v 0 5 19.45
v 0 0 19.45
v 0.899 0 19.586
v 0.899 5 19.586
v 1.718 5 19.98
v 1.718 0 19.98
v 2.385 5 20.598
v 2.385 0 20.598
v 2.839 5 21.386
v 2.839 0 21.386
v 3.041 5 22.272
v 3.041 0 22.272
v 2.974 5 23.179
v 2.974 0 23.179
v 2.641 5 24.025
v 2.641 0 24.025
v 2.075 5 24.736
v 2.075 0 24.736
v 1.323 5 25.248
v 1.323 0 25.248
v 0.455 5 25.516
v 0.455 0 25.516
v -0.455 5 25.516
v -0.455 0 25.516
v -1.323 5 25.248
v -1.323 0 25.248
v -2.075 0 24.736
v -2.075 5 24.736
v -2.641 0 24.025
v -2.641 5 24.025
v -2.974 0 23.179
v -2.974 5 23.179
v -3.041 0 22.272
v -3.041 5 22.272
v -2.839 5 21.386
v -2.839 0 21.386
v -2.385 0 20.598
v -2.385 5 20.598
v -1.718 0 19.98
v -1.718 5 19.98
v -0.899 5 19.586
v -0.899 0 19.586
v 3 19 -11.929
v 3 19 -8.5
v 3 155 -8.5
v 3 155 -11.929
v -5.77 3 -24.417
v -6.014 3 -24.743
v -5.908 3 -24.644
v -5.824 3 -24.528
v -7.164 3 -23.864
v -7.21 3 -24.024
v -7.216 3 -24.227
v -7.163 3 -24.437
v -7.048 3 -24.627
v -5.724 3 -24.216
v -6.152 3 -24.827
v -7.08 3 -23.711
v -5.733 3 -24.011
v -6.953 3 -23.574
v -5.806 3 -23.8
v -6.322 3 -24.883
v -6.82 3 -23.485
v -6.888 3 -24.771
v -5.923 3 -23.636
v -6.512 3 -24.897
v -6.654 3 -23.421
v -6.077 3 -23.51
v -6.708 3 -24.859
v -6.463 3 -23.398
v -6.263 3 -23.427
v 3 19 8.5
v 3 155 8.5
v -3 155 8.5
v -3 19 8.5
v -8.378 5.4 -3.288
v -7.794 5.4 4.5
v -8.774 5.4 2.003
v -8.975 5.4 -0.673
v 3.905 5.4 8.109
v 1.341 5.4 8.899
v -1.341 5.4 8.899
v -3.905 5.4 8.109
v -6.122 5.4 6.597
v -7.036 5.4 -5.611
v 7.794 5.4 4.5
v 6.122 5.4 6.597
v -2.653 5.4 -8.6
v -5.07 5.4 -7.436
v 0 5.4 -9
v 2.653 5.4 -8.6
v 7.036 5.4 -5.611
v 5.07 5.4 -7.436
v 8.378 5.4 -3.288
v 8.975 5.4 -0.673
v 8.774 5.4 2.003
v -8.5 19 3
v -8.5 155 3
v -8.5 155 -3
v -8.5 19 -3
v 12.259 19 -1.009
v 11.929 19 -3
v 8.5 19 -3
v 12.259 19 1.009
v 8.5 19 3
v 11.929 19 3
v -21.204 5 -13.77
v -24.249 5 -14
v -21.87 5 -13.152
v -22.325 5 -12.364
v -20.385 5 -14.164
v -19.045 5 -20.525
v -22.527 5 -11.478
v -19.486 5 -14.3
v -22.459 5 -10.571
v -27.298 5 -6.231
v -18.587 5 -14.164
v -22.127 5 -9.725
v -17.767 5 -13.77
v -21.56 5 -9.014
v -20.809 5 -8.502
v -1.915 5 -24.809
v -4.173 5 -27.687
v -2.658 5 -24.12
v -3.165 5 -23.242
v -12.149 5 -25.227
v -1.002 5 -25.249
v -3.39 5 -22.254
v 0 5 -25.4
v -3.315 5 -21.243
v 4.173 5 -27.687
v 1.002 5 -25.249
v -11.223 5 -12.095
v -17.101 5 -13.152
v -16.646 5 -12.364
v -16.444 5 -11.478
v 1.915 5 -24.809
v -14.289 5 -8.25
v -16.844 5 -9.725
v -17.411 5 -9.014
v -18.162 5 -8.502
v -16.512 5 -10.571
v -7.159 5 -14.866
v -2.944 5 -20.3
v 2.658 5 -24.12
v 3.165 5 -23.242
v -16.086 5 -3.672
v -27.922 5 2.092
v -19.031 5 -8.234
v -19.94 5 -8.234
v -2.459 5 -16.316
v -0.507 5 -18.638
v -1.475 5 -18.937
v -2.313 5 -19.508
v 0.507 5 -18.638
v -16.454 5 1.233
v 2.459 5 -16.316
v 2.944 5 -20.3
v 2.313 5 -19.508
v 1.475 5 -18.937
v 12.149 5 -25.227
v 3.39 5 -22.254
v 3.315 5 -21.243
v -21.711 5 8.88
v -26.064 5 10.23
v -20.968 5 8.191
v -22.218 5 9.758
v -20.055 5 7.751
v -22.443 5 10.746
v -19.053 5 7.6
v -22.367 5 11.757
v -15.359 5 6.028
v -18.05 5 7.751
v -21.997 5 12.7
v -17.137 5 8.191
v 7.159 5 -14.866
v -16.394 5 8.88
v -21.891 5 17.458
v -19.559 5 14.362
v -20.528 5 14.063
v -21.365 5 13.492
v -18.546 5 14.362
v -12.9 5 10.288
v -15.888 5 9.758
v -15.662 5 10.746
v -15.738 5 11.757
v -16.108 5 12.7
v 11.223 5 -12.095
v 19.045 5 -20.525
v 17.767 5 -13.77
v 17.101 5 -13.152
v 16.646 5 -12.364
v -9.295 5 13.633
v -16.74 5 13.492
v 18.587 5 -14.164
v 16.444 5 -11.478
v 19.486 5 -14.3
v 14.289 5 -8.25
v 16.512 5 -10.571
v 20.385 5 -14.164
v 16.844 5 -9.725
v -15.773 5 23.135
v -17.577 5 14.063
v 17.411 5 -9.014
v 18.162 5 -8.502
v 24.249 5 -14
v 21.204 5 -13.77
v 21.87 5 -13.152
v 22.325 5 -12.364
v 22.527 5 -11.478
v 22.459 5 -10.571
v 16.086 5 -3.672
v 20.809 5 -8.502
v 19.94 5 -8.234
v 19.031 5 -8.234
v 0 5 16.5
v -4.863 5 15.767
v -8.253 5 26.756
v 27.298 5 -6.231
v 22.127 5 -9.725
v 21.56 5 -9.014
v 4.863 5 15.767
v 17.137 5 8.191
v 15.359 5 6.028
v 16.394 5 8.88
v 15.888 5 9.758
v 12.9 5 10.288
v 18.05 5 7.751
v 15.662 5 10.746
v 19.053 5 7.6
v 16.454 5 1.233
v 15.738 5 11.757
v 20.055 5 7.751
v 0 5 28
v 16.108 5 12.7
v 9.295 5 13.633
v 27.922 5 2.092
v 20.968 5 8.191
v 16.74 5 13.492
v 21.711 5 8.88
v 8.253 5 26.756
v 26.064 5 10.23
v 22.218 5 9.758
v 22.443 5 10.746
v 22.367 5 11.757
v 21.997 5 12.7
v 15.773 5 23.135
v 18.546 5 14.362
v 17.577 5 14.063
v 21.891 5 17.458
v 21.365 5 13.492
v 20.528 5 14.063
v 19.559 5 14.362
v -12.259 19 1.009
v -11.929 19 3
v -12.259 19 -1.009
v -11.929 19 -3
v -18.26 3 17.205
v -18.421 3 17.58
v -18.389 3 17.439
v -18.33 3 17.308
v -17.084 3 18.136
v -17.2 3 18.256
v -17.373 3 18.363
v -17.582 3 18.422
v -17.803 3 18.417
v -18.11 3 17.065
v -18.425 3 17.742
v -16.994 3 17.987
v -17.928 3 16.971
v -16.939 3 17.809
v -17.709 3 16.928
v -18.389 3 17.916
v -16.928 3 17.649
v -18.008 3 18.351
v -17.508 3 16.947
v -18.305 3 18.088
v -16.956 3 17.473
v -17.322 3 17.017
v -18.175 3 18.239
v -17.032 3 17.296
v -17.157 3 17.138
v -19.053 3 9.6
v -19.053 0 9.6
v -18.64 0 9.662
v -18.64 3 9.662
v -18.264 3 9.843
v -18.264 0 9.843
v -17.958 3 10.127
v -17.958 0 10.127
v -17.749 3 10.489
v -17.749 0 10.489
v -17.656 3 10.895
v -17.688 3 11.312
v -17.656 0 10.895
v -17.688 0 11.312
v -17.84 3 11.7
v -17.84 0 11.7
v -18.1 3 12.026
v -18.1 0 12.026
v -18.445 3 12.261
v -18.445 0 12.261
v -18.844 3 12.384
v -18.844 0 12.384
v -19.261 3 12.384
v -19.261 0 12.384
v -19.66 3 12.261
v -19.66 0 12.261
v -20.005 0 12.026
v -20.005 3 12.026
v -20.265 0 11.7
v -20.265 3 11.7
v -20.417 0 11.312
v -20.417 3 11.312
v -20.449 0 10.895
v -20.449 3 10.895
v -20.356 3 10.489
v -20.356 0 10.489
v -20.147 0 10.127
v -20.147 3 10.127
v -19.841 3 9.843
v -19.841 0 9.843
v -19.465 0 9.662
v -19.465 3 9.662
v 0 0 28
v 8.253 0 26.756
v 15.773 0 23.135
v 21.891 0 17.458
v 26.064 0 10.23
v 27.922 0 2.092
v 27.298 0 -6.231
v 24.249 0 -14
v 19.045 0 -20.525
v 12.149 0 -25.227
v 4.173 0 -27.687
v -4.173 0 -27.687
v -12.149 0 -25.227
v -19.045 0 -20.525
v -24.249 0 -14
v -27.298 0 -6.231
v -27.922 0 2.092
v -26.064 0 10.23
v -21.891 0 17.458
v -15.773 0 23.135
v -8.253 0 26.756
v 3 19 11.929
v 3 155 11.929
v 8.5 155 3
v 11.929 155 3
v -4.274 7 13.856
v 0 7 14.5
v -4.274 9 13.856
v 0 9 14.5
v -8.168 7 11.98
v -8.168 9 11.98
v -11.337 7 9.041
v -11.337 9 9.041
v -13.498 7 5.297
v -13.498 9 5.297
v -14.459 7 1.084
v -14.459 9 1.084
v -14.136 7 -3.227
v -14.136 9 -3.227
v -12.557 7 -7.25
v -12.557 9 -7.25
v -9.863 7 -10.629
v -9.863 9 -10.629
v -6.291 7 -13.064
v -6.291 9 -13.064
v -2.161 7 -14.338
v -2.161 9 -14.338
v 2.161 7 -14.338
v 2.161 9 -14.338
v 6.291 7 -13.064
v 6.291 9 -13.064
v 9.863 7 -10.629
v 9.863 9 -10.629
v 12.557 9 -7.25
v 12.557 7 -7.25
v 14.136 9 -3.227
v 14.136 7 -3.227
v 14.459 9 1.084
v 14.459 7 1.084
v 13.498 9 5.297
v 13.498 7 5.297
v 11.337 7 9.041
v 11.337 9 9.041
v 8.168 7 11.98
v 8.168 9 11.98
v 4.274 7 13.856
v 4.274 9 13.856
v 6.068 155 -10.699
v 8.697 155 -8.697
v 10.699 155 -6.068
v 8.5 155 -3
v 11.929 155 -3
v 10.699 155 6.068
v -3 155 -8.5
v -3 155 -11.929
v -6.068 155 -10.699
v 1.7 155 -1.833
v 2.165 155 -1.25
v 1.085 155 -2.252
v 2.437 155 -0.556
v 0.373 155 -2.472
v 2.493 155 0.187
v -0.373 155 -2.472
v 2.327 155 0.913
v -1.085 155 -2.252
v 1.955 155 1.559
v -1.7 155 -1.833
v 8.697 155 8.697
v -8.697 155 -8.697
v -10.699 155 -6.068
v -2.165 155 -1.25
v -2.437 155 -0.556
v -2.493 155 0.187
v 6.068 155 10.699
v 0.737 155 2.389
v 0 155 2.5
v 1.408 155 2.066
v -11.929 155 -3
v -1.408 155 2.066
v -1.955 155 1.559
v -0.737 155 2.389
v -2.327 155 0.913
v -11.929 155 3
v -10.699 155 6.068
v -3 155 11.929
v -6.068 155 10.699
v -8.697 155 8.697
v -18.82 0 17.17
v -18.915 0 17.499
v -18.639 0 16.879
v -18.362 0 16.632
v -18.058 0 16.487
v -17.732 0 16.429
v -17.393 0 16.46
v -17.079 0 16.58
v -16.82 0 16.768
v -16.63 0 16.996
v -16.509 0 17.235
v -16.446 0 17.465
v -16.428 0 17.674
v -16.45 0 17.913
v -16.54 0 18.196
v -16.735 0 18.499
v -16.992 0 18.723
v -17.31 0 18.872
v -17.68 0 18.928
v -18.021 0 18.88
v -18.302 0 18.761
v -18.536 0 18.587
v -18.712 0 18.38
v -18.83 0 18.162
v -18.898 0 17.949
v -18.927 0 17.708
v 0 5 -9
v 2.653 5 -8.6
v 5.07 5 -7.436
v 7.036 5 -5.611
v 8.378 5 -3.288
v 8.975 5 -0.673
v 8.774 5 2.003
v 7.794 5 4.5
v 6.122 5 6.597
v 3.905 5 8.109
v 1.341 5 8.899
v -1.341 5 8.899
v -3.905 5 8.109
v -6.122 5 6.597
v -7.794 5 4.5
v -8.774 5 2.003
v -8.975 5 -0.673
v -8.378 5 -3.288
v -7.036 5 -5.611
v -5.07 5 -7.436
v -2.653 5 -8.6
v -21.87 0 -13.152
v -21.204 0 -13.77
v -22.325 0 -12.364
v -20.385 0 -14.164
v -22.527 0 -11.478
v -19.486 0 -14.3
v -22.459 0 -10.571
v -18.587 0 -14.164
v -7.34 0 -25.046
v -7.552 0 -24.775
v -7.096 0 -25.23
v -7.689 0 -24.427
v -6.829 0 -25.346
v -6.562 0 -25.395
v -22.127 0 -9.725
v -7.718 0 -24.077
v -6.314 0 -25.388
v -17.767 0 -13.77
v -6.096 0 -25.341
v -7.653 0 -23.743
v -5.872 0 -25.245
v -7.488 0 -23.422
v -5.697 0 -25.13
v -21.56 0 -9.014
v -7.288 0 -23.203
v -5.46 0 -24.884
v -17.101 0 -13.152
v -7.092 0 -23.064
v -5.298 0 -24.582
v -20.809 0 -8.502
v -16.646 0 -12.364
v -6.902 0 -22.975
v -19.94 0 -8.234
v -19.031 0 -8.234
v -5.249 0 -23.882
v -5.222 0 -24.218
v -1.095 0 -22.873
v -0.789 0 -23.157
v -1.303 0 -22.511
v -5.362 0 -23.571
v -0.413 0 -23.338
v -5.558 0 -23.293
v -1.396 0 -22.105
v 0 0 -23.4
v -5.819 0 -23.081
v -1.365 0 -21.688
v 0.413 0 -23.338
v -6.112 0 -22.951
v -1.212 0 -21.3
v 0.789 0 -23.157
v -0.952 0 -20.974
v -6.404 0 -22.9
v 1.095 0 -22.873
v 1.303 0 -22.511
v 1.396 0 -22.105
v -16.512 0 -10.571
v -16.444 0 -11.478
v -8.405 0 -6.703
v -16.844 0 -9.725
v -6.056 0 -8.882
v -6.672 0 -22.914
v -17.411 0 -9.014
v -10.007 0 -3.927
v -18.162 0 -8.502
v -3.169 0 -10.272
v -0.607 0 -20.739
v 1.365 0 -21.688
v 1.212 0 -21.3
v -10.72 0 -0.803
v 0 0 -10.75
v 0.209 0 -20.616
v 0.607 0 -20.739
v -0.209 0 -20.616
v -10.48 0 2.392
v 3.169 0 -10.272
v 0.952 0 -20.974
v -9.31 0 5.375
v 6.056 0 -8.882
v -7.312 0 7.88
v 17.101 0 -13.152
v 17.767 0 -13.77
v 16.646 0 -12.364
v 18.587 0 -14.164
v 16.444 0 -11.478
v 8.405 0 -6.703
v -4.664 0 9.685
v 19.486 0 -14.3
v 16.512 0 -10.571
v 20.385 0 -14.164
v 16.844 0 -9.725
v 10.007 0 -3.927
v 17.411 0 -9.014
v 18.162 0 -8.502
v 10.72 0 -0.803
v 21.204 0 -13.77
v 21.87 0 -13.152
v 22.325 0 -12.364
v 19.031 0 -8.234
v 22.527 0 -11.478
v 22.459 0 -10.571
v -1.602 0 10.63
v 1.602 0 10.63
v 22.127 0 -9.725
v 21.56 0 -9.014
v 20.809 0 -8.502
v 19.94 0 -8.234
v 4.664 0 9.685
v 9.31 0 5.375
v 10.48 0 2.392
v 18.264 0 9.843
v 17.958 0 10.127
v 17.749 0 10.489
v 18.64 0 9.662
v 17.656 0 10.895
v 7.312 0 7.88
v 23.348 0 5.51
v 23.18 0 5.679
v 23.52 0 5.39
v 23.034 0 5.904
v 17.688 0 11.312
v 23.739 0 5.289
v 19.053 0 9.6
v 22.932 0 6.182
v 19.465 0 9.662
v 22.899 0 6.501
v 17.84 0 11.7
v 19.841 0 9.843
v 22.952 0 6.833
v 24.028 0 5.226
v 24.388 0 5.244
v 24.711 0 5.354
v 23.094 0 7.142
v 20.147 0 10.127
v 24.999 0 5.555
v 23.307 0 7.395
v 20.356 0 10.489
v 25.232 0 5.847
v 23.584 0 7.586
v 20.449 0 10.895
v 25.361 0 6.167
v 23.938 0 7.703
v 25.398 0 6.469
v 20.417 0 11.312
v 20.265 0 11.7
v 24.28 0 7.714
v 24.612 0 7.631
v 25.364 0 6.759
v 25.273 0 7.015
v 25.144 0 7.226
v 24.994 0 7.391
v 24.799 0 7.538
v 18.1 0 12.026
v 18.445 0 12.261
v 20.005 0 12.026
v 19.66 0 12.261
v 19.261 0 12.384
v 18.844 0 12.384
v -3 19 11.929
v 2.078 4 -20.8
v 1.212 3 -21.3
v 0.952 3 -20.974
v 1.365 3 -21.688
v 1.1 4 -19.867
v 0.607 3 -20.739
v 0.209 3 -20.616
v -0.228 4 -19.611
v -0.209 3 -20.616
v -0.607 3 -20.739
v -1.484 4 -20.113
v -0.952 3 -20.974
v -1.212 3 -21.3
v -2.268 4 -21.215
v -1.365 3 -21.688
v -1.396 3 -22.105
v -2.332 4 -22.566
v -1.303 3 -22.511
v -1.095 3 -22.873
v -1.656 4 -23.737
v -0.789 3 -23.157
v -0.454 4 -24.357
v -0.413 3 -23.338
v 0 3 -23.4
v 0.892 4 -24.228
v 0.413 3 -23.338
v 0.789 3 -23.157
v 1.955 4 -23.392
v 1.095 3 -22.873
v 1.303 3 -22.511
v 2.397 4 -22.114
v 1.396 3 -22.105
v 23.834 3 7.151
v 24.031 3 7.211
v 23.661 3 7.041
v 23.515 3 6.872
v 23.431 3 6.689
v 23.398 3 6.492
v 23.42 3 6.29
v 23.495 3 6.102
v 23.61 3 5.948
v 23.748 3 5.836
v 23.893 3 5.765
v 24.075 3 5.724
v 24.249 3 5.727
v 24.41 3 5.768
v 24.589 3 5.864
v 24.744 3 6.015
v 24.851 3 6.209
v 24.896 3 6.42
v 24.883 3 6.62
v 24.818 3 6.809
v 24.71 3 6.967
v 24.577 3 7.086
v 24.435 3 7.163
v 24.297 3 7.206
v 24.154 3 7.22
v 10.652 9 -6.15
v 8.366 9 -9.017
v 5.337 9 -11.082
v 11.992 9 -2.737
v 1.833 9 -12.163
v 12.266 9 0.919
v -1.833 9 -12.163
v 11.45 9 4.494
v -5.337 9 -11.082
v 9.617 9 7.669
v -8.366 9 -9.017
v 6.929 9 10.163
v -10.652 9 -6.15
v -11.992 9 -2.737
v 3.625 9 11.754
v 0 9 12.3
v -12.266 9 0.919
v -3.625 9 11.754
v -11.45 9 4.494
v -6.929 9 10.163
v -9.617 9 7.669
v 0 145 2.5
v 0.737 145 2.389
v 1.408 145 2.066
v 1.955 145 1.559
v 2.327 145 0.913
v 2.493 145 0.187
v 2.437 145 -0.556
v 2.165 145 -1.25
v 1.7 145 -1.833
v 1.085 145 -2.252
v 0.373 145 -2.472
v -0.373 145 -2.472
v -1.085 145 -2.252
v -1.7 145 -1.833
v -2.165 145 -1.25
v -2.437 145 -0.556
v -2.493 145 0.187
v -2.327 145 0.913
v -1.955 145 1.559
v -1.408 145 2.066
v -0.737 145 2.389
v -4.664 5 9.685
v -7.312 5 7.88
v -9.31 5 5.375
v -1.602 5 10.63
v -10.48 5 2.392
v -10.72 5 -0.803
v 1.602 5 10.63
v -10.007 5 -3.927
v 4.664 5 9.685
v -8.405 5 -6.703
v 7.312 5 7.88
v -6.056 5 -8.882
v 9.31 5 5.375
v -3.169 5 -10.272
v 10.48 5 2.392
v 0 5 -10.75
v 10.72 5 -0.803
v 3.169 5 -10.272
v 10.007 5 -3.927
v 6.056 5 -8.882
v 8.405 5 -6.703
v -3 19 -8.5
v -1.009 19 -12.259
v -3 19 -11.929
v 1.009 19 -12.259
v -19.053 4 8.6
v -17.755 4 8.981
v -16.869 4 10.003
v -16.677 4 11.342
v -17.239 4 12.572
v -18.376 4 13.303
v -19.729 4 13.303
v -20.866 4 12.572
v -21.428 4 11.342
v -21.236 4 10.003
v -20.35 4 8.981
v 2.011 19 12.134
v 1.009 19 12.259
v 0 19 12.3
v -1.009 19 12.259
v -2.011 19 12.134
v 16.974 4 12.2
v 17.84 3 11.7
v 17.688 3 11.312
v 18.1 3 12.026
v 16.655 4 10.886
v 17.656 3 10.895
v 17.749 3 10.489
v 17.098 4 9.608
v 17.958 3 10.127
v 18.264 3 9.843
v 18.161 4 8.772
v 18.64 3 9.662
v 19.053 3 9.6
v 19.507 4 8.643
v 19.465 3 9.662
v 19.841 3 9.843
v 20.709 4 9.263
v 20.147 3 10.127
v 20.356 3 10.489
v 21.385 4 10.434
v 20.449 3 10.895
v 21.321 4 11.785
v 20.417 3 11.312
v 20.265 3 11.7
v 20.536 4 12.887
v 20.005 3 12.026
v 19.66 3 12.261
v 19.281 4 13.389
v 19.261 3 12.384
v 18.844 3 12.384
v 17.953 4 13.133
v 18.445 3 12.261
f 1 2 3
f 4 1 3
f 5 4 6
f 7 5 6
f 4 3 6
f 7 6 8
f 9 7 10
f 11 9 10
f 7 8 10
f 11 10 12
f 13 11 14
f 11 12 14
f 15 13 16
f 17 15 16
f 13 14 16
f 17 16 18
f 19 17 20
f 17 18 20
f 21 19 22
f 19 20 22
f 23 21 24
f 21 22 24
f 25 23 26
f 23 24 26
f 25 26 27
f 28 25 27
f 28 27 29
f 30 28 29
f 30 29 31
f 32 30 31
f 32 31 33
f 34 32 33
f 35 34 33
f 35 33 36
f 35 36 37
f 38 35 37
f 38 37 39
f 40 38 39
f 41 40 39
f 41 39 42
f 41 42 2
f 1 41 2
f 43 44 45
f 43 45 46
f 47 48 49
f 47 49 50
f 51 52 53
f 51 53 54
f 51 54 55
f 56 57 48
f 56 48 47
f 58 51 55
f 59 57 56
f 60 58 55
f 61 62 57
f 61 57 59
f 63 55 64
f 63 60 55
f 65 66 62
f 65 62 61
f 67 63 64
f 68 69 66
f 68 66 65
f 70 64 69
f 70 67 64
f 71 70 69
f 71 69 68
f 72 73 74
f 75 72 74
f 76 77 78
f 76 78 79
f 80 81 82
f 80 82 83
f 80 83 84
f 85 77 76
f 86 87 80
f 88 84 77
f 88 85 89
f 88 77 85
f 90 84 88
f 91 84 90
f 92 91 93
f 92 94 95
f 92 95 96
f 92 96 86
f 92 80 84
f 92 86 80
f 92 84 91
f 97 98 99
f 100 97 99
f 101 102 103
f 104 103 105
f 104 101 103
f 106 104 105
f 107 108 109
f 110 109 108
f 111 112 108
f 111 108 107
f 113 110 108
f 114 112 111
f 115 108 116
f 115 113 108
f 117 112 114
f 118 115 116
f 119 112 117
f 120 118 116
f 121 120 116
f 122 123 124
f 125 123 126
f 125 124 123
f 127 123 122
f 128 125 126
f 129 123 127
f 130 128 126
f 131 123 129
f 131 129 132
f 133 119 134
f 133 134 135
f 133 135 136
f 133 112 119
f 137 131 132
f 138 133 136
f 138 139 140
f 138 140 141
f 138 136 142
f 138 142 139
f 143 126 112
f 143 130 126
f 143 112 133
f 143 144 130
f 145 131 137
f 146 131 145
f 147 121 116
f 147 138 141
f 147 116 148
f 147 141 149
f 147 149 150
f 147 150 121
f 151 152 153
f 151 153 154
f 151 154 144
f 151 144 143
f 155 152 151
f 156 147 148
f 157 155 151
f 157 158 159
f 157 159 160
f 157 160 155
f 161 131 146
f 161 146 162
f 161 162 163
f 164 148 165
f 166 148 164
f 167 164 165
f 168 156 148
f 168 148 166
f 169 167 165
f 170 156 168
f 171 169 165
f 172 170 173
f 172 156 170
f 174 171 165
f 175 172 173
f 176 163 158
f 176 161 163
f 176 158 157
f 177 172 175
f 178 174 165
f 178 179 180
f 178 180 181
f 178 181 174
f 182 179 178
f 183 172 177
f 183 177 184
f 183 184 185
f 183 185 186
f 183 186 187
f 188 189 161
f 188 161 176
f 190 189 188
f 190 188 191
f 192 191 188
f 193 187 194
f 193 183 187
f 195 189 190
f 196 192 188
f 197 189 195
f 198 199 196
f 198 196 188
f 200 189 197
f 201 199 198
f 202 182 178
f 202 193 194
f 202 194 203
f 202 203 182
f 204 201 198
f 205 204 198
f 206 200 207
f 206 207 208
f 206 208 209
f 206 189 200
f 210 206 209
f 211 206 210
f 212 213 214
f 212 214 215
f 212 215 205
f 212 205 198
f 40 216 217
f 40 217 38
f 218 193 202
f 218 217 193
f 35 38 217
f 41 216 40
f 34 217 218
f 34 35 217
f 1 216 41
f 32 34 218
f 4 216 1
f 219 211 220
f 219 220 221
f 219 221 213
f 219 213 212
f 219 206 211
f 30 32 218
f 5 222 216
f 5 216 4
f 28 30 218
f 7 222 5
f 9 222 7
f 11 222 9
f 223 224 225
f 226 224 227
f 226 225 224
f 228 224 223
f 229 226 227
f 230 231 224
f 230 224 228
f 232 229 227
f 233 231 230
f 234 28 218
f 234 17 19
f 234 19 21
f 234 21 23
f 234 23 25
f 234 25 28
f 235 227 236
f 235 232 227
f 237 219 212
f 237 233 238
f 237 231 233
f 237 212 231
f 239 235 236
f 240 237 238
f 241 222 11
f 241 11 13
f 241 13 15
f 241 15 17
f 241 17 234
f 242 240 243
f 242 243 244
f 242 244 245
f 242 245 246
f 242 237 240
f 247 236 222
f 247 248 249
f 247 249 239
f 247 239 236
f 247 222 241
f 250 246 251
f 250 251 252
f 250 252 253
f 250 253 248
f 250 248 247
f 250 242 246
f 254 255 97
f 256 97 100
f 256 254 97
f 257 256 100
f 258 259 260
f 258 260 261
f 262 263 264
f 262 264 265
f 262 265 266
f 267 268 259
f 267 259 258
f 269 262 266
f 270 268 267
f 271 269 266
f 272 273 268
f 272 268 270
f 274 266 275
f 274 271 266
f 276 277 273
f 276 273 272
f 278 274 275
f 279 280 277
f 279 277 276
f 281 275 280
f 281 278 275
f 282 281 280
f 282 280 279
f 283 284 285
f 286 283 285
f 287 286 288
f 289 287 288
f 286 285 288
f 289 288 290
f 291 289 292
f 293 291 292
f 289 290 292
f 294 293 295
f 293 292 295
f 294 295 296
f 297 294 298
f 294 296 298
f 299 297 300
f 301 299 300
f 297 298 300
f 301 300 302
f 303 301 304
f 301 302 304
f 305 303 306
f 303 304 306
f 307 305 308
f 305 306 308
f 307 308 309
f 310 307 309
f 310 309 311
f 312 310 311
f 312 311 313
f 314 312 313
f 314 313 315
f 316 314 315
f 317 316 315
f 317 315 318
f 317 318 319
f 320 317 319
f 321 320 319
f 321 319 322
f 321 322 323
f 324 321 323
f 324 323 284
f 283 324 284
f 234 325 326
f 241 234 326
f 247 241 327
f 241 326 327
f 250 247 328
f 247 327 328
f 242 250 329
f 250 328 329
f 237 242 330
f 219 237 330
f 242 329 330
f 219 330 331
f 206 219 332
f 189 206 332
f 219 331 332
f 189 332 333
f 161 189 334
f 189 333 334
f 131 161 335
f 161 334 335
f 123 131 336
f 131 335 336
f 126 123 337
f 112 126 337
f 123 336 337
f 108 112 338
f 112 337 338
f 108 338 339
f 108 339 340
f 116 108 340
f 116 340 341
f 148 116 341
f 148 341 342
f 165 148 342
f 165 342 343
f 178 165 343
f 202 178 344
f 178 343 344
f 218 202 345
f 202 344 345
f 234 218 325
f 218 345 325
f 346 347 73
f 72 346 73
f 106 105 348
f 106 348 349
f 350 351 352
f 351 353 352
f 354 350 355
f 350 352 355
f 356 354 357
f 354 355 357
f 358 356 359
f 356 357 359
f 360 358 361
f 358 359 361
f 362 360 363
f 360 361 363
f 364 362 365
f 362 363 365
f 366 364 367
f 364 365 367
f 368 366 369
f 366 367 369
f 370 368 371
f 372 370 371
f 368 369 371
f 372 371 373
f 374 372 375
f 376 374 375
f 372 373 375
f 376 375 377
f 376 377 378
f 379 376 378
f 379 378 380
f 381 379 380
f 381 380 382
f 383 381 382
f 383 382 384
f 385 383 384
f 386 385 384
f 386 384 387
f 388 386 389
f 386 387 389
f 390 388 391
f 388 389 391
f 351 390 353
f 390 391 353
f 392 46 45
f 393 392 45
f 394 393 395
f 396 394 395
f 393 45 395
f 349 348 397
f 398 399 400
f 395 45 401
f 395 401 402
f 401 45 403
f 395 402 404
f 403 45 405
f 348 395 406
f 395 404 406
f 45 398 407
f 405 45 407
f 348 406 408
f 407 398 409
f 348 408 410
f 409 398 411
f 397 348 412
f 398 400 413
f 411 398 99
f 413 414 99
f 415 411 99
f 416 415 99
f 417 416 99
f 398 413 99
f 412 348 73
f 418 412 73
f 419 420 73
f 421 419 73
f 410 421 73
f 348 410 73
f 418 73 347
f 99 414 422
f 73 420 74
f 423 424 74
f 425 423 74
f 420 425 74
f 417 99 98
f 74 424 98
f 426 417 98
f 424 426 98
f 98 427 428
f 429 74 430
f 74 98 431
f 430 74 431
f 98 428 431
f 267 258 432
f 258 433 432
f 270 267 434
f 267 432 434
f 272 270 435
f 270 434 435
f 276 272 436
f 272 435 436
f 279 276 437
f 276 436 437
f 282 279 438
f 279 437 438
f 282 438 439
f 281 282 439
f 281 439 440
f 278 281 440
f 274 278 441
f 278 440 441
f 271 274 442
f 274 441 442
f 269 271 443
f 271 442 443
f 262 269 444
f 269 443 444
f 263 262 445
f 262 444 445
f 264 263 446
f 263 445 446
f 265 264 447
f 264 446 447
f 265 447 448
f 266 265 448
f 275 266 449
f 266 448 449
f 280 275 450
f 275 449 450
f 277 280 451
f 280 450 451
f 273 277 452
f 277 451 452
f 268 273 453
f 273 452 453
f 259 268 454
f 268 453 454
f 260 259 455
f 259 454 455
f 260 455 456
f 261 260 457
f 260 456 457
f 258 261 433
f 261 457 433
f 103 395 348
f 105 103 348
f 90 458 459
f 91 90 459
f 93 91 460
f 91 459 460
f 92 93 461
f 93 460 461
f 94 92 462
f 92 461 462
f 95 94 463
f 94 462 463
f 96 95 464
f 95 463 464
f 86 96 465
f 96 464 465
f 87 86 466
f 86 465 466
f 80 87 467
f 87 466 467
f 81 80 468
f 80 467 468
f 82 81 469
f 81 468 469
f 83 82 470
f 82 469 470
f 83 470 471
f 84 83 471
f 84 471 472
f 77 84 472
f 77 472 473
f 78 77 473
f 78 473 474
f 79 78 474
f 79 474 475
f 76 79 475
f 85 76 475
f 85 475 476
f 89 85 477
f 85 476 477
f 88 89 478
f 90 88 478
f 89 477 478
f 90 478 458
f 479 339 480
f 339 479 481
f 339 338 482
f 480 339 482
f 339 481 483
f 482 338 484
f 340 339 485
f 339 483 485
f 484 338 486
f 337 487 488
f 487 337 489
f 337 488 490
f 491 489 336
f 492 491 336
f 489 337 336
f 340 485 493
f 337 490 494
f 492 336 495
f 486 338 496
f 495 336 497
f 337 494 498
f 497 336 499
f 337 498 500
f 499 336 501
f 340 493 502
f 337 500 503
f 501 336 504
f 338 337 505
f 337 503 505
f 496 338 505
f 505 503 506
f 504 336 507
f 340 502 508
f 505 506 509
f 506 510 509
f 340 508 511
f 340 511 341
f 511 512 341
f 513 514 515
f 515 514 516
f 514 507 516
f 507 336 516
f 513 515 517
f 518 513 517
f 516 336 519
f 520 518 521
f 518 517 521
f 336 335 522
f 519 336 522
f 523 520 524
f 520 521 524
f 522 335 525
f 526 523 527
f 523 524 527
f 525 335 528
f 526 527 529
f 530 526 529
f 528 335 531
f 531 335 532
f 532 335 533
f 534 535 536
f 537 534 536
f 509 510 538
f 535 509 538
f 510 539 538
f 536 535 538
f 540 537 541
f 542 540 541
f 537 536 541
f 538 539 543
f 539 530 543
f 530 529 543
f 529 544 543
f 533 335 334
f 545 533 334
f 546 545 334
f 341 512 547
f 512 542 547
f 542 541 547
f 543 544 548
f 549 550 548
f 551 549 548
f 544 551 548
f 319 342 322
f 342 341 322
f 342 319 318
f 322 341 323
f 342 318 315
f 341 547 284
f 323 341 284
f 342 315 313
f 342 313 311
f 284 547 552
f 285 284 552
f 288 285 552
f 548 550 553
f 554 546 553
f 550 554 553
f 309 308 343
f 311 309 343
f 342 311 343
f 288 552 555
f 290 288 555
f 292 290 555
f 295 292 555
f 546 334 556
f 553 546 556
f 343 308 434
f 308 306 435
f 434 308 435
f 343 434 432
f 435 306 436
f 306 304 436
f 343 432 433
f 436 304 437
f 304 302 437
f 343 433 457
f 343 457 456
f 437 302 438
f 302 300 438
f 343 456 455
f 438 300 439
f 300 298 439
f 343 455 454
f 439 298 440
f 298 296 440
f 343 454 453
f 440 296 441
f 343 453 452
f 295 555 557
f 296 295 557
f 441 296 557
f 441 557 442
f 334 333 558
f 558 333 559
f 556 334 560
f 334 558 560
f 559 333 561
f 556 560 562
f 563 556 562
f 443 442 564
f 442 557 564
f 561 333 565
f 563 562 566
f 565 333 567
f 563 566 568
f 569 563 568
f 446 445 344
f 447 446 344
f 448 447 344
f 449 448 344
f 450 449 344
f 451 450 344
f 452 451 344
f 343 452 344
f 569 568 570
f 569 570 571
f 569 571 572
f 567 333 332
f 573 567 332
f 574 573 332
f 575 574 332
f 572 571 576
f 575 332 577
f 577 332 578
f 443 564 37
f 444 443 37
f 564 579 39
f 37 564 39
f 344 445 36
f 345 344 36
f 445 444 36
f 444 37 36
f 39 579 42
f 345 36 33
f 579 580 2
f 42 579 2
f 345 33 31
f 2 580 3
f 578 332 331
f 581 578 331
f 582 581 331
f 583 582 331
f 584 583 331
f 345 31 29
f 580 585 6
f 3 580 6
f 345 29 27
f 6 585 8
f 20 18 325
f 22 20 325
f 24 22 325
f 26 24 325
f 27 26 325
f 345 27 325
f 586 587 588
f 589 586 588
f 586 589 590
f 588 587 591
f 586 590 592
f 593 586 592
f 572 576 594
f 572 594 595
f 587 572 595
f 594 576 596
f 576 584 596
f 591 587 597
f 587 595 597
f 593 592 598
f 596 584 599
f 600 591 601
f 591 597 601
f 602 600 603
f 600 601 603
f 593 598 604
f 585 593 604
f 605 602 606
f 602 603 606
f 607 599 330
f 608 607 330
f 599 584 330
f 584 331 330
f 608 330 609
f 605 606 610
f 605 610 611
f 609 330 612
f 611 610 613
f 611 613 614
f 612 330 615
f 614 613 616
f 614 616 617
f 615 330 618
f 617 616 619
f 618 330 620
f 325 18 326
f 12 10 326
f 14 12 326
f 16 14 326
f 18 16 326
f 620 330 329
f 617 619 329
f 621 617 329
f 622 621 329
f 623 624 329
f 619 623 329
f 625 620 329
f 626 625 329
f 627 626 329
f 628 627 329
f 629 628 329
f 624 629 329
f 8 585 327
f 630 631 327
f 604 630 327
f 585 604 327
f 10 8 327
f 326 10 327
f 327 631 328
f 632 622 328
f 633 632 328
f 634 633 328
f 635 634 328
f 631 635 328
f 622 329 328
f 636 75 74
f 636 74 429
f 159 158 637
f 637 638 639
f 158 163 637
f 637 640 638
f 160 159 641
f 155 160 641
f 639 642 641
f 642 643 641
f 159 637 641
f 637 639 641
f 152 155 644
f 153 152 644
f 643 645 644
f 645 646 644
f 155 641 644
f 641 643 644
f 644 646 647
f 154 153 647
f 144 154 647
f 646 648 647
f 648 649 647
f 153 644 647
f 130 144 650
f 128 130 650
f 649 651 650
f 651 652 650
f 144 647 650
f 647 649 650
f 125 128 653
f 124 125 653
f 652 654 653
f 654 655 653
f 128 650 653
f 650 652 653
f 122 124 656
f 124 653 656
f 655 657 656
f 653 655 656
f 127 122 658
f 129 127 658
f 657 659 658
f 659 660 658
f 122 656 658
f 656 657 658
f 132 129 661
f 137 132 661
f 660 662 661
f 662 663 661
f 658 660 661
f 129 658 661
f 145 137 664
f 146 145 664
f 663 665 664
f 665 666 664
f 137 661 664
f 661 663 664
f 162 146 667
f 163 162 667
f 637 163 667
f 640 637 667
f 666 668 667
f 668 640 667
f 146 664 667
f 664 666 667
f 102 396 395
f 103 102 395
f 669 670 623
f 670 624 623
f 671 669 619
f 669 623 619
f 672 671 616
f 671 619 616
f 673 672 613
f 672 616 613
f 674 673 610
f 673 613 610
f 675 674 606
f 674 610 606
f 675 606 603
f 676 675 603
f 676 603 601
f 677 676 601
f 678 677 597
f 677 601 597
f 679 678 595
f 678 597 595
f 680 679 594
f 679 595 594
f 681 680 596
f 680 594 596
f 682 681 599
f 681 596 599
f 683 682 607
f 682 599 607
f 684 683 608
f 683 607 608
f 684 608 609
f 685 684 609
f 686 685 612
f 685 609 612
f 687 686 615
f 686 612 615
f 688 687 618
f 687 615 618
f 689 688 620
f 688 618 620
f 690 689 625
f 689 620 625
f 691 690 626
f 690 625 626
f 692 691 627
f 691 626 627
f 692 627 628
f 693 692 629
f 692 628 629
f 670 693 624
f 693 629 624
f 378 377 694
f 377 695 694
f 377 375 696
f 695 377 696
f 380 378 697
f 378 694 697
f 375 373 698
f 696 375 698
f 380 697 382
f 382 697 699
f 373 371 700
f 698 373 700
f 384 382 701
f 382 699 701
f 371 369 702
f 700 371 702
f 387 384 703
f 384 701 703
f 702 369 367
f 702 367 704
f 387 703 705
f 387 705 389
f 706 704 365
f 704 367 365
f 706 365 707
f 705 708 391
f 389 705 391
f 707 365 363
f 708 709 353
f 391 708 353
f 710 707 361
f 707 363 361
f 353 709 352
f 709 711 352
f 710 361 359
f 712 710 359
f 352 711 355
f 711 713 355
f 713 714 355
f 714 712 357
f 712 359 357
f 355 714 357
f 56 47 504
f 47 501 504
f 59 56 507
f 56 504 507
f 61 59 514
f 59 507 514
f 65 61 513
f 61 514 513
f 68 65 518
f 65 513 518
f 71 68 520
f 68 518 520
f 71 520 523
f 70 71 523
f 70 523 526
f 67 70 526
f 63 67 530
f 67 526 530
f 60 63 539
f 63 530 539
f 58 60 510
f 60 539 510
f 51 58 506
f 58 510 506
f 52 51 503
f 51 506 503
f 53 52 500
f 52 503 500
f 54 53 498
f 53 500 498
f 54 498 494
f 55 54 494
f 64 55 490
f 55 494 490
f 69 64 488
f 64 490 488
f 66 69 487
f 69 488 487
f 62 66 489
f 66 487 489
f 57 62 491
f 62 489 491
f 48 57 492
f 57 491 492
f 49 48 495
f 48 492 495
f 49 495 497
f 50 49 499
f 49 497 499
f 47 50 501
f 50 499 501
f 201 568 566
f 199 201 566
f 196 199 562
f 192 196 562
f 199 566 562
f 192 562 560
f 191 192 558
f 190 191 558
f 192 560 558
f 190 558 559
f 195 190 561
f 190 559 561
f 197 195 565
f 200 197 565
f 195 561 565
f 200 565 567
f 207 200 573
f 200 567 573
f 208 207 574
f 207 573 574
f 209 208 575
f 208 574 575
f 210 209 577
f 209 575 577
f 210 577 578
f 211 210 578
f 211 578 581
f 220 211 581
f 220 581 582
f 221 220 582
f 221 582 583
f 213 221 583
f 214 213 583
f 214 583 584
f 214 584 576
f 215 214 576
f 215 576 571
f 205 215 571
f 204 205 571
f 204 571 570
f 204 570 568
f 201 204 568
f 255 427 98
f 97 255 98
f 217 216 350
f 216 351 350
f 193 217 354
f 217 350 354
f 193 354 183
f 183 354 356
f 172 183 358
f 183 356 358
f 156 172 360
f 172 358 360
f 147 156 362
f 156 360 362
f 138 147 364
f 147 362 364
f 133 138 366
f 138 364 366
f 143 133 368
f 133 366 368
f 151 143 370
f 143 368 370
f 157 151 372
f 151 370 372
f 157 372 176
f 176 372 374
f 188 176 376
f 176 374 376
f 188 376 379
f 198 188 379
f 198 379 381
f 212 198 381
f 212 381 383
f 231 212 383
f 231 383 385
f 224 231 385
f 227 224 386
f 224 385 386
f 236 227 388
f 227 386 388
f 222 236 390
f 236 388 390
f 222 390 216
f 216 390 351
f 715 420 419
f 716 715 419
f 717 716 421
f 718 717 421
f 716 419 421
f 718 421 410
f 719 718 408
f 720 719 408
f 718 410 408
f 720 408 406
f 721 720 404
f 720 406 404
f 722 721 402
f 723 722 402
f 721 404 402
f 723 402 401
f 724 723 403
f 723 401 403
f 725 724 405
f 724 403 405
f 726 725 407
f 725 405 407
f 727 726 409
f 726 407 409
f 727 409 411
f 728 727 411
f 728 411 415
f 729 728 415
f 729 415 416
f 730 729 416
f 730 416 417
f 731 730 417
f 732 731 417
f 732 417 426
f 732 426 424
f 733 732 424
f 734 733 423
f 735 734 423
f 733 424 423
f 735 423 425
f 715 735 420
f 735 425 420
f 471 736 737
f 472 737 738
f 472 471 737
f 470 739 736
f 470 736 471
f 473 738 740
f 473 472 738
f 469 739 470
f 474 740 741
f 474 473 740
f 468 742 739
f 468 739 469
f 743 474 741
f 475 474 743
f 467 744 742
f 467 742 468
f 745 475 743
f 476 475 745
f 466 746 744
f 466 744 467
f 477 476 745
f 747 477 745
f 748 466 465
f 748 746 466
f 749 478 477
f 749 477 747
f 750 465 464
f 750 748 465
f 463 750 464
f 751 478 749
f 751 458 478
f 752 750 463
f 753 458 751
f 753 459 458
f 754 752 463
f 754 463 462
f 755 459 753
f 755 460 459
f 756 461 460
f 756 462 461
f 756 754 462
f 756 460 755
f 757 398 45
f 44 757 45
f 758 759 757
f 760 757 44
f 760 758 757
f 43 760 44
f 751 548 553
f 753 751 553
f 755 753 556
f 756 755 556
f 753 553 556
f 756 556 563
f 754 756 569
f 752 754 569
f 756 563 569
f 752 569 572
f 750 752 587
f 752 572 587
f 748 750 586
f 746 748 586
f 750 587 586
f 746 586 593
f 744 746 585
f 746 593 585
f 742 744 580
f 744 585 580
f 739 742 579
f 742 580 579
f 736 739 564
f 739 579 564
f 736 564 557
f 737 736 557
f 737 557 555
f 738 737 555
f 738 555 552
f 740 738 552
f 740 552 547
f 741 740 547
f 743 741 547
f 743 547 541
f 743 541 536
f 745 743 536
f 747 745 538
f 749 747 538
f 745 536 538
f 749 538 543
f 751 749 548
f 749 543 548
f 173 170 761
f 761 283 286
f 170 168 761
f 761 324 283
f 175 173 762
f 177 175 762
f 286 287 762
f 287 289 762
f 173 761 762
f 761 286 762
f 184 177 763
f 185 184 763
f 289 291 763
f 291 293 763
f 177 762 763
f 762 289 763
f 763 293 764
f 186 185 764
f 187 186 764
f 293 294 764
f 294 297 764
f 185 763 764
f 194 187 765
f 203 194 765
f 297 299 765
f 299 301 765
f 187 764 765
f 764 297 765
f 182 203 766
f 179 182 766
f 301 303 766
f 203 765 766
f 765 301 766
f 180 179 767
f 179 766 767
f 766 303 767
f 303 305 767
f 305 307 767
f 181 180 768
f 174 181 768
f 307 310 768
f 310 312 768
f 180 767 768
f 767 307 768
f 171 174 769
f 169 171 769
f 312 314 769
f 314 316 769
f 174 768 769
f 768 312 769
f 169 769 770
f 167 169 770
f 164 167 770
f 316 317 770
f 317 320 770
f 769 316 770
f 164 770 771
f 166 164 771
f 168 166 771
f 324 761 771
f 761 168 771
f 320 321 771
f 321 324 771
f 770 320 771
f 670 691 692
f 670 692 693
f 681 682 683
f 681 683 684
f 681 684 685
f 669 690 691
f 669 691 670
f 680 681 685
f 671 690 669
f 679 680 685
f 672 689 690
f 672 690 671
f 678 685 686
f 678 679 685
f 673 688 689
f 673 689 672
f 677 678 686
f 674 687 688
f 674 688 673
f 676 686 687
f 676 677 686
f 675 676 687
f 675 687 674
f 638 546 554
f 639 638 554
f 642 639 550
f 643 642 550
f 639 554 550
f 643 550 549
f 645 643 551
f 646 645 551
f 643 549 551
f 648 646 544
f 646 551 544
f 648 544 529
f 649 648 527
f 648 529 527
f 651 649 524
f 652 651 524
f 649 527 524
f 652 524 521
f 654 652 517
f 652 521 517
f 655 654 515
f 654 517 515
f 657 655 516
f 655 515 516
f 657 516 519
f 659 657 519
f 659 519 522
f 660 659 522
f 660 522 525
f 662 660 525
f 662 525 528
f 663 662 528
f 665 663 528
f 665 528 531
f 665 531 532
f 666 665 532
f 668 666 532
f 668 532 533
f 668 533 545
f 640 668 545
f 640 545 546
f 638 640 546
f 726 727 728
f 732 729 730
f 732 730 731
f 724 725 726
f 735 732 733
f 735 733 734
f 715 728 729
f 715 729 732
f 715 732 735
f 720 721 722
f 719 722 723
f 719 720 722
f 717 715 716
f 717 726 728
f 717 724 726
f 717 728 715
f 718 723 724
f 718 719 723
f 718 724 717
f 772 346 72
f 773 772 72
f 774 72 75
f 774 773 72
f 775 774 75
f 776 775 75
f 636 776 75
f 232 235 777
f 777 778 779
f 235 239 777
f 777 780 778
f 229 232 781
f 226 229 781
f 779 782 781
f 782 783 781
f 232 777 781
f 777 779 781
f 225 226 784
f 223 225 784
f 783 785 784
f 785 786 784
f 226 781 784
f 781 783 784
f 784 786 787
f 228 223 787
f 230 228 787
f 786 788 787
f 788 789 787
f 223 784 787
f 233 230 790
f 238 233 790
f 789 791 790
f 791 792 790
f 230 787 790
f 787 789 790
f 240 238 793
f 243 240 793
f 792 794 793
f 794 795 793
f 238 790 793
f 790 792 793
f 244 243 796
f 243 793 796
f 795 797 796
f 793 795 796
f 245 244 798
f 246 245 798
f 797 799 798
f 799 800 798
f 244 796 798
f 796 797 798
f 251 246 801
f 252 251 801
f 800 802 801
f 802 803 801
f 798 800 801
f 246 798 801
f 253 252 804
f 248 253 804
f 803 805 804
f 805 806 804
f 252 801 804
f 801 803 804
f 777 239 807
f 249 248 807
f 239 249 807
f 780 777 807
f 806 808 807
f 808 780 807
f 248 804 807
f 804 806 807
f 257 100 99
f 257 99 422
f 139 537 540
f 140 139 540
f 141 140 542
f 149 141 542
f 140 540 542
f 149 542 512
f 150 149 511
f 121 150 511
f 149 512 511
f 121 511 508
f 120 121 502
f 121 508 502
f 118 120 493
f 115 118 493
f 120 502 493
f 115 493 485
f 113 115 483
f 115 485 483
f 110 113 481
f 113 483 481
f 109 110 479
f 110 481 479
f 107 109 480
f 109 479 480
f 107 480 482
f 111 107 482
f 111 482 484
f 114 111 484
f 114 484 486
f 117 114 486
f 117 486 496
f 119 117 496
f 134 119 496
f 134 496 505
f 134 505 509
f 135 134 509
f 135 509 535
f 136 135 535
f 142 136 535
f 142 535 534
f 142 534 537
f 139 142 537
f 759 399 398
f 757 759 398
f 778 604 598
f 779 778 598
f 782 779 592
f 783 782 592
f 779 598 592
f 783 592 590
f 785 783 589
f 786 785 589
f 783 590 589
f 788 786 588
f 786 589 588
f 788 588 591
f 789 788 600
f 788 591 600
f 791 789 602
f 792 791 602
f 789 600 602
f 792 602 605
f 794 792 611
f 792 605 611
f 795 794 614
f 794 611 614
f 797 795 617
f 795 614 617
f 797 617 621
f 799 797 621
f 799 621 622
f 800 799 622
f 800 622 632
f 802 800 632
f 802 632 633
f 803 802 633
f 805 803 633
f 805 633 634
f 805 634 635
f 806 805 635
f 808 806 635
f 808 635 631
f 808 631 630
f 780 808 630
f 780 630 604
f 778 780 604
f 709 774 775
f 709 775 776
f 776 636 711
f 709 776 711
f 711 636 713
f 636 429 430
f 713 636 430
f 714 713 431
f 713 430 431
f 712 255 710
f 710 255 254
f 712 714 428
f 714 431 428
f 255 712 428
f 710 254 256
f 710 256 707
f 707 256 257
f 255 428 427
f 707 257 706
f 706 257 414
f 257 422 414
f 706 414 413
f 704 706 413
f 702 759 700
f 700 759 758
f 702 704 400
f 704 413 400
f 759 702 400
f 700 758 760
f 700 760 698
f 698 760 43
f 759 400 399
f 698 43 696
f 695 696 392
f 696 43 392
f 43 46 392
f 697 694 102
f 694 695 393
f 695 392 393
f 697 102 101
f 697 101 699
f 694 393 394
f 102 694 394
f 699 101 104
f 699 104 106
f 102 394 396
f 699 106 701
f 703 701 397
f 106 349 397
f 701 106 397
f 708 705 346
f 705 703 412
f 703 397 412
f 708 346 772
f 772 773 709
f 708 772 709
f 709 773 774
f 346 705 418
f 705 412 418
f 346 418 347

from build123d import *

# Parameters (mm, degrees)
ESBO_O1_R                = 28
RESSALTO_EXTRUS_O1_DEPTH = 5
ESBO_O6_R                = 10.75
CORTE_EXTRUS_O1_DEPTH    = 5
ESBO_O7_R                = 9
CORTE_EXTRUS_O2_DEPTH    = 0.4
CORTE_EXTRUS_O3_REACH    = 161.978
ESBO_O8_R                = 3.05
PADR_OCIRCULAR1_COUNT    = 3
CORTE_EXTRUS_O4_REACH    = 161.978
ESBO_O9_R                = 1.4
PADR_OCIRCULAR2_COUNT    = 3
PADR_OCIRCULAR3_COUNT    = 3
CHANFRO1_SIZE            = 2
CHANFRO2_SIZE            = 2
CORTE_EXTRUS_O5_DEPTH    = 136
PADR_OCIRCULAR4_COUNT    = 4
ESBO_O18_R               = 2.5
CORTE_EXTRUS_O6_DEPTH    = 10


with BuildPart() as part:
    # Esboço1 → Ressalto-extrusão1 (new body)
    with BuildSketch(Plane(origin=(0, 0, 0), x_dir=(1, 0, 0), z_dir=(0, 1, 0))):
        with Locations(Location((0, 0, 0), (0, 0, 270))):
            Circle(ESBO_O1_R)
    extrude(amount=RESSALTO_EXTRUS_O1_DEPTH)

    # Esboço5 → Revolução1 (revolve)
    with BuildSketch(Plane(origin=(0, 0, 0), x_dir=(0, 0, -1), z_dir=(1, 0, 0))):
        Polygon((0, 5), (-16.5, 5), (-14.5, 7), (-14.5, 9), (-12.3, 9), (-12.3, 155), (0, 155), align=None)
    revolve(axis=Axis((0, 155, 0), (0, -1, 0)))

    # Esboço6 → Corte-extrusão1 (cut)
    with BuildSketch(Plane.XZ):
        with Locations(Location((0, 0, 0), (0, 0, 270))):
            Circle(ESBO_O6_R)
    extrude(amount=-CORTE_EXTRUS_O1_DEPTH, mode=Mode.SUBTRACT)

    # Esboço7 → Corte-extrusão2 (cut)
    with BuildSketch(Plane.XZ.offset(-5)):
        with Locations(Location((0, 0, 0), (0, 0, 270))):
            Circle(ESBO_O7_R)
    extrude(amount=-CORTE_EXTRUS_O2_DEPTH, mode=Mode.SUBTRACT)

    # Esboço8 → Corte-extrusão3 (cut, up to next)
    with BuildSketch(Plane.XZ, mode=Mode.PRIVATE) as corte_extrus_o3_sk1:
        with Locations(Location((0, 22.5, 0), (0, 0, 270))):
            Circle(ESBO_O8_R)
    corte_extrus_o3_tool1 = extrude(corte_extrus_o3_sk1.sketch, amount=-CORTE_EXTRUS_O3_REACH, mode=Mode.PRIVATE) & part.part
    corte_extrus_o3 = corte_extrus_o3_tool1.solids().sort_by_distance((0, 0, 22.5))[0]
    add(corte_extrus_o3, mode=Mode.SUBTRACT)

    # PadrãoCircular1: Corte-extrusão3 ×3 about axis
    padr_ocircular1_axis = Axis((0, 0, 0), (0, 1, 0))
    for i in range(1, PADR_OCIRCULAR1_COUNT):
        add(corte_extrus_o3.rotate(padr_ocircular1_axis, i * 360 / PADR_OCIRCULAR1_COUNT), mode=Mode.SUBTRACT)

    # Esboço9 → Corte-extrusão4 (cut, up to next)
    with BuildSketch(Plane.XZ, mode=Mode.PRIVATE) as corte_extrus_o4_sk1:
        with Locations(Location((-19.052558883, 11, 0), (0, 0, 270))):
            Circle(ESBO_O9_R)
    corte_extrus_o4_tool1 = extrude(corte_extrus_o4_sk1.sketch, amount=-CORTE_EXTRUS_O4_REACH, mode=Mode.PRIVATE) & part.part
    corte_extrus_o4 = corte_extrus_o4_tool1.solids().sort_by_distance((-19.052559, 0, 11))[0]
    add(corte_extrus_o4, mode=Mode.SUBTRACT)

    # PadrãoCircular2: Corte-extrusão4 ×3 about axis
    padr_ocircular2_axis = Axis((0, 0, 0), (0, 1, 0))
    for i in range(1, PADR_OCIRCULAR2_COUNT):
        add(corte_extrus_o4.rotate(padr_ocircular2_axis, i * 360 / PADR_OCIRCULAR2_COUNT), mode=Mode.SUBTRACT)

    # Loft de corte1: read off the stored shape, not the designer's step
    # Loft de corte1: loft between two sections, ruled curve by curve
    loft_de_corte1_from = [
        Edge.make_bspline([(-18.260331243, 3, 17.20543513), (-17.315862444, 3, 16.040111704), (-16.150539018, 3, 16.984580503), (-17.095007817, 3, 18.149903929), (-18.039476615, 3, 19.315227355), (-19.204800042, 3, 18.370758556), (-18.260331243, 3, 17.20543513)], [0, 0, 0, 0, 0.5, 0.5, 0.5, 1, 1, 1, 1], 3, [1, 0.333333333, 0.333333333, 1, 0.333333333, 0.333333333, 1]),
    ]
    loft_de_corte1_to = [
        Edge.make_bspline([(-18.914864913, 0, 17.499210616), (-18.557947085, 0, 15.024819849), (-16.083556319, 0, 15.381737677), (-16.440474147, 0, 17.856128444), (-16.797391974, 0, 20.33051921), (-19.271782741, 0, 19.973601382), (-18.914864913, 0, 17.499210616)], [0, 0, 0, 0, 0.5, 0.5, 0.5, 1, 1, 1, 1], 3, [1, 0.333333333, 0.333333333, 1, 0.333333333, 0.333333333, 1]),
    ]
    loft_de_corte1 = Solid(Shell([*[Face.make_surface_from_curves(loft_de_corte1_from[k], loft_de_corte1_to[k]) for k in range(1)], Face(Wire(loft_de_corte1_from)), Face(Wire(loft_de_corte1_to))]))
    add(loft_de_corte1, mode=Mode.SUBTRACT)

    # PadrãoCircular3: Loft de corte1 ×3 about axis
    padr_ocircular3_axis = Axis((0, 0, 0), (0, 1, 0))
    for i in range(1, PADR_OCIRCULAR3_COUNT):
        add(loft_de_corte1.rotate(padr_ocircular3_axis, i * 360 / PADR_OCIRCULAR3_COUNT), mode=Mode.SUBTRACT)

    # Chanfro1
    chanfro1_edges = [part.edges().sort_by_distance(p)[0] for p in [
        (-19.052558883, 5, 12.4),
    ]]
    chamfer(chanfro1_edges, length=CHANFRO1_SIZE)

    # Chanfro2
    chanfro2_edges = [part.edges().sort_by_distance(p)[0] for p in [
        (20.264994449, 5, 10.3),
        (-1.212435565, 5, -22.7),
    ]]
    chamfer(chanfro2_edges, length=CHANFRO2_SIZE)

    # Esboço17 → Corte-extrusão5 (cut)
    with BuildSketch(Plane(origin=(0, 155, 0), x_dir=(1, 0, 0), z_dir=(0, 1, 0))):
        with BuildLine():
            Line((-3, 8.5), (3, 8.5))
            Line((3, 8.5), (3, 11.928537211))
            ThreePointArc((3, 11.928537211), (0, 12.3), (-3, 11.928537211))
            Line((-3, 11.928537211), (-3, 8.5))
        make_face()
    corte_extrus_o5 = extrude(amount=-CORTE_EXTRUS_O5_DEPTH, mode=Mode.SUBTRACT)

    # PadrãoCircular4: Corte-extrusão5 ×4 about axis
    padr_ocircular4_axis = Axis((0, 0, 0), (0, 1, 0))
    for i in range(1, PADR_OCIRCULAR4_COUNT):
        add(corte_extrus_o5.rotate(padr_ocircular4_axis, i * 360 / PADR_OCIRCULAR4_COUNT), mode=Mode.SUBTRACT)

    # Esboço18 → Corte-extrusão6 (cut)
    with BuildSketch(Plane(origin=(0, 155, 0), x_dir=(1, 0, 0), z_dir=(0, 1, 0))):
        with Locations(Location((0, 0, 0), (0, 0, 270))):
            Circle(ESBO_O18_R)
    extrude(amount=-CORTE_EXTRUS_O6_DEPTH, mode=Mode.SUBTRACT)


solid = part.part
